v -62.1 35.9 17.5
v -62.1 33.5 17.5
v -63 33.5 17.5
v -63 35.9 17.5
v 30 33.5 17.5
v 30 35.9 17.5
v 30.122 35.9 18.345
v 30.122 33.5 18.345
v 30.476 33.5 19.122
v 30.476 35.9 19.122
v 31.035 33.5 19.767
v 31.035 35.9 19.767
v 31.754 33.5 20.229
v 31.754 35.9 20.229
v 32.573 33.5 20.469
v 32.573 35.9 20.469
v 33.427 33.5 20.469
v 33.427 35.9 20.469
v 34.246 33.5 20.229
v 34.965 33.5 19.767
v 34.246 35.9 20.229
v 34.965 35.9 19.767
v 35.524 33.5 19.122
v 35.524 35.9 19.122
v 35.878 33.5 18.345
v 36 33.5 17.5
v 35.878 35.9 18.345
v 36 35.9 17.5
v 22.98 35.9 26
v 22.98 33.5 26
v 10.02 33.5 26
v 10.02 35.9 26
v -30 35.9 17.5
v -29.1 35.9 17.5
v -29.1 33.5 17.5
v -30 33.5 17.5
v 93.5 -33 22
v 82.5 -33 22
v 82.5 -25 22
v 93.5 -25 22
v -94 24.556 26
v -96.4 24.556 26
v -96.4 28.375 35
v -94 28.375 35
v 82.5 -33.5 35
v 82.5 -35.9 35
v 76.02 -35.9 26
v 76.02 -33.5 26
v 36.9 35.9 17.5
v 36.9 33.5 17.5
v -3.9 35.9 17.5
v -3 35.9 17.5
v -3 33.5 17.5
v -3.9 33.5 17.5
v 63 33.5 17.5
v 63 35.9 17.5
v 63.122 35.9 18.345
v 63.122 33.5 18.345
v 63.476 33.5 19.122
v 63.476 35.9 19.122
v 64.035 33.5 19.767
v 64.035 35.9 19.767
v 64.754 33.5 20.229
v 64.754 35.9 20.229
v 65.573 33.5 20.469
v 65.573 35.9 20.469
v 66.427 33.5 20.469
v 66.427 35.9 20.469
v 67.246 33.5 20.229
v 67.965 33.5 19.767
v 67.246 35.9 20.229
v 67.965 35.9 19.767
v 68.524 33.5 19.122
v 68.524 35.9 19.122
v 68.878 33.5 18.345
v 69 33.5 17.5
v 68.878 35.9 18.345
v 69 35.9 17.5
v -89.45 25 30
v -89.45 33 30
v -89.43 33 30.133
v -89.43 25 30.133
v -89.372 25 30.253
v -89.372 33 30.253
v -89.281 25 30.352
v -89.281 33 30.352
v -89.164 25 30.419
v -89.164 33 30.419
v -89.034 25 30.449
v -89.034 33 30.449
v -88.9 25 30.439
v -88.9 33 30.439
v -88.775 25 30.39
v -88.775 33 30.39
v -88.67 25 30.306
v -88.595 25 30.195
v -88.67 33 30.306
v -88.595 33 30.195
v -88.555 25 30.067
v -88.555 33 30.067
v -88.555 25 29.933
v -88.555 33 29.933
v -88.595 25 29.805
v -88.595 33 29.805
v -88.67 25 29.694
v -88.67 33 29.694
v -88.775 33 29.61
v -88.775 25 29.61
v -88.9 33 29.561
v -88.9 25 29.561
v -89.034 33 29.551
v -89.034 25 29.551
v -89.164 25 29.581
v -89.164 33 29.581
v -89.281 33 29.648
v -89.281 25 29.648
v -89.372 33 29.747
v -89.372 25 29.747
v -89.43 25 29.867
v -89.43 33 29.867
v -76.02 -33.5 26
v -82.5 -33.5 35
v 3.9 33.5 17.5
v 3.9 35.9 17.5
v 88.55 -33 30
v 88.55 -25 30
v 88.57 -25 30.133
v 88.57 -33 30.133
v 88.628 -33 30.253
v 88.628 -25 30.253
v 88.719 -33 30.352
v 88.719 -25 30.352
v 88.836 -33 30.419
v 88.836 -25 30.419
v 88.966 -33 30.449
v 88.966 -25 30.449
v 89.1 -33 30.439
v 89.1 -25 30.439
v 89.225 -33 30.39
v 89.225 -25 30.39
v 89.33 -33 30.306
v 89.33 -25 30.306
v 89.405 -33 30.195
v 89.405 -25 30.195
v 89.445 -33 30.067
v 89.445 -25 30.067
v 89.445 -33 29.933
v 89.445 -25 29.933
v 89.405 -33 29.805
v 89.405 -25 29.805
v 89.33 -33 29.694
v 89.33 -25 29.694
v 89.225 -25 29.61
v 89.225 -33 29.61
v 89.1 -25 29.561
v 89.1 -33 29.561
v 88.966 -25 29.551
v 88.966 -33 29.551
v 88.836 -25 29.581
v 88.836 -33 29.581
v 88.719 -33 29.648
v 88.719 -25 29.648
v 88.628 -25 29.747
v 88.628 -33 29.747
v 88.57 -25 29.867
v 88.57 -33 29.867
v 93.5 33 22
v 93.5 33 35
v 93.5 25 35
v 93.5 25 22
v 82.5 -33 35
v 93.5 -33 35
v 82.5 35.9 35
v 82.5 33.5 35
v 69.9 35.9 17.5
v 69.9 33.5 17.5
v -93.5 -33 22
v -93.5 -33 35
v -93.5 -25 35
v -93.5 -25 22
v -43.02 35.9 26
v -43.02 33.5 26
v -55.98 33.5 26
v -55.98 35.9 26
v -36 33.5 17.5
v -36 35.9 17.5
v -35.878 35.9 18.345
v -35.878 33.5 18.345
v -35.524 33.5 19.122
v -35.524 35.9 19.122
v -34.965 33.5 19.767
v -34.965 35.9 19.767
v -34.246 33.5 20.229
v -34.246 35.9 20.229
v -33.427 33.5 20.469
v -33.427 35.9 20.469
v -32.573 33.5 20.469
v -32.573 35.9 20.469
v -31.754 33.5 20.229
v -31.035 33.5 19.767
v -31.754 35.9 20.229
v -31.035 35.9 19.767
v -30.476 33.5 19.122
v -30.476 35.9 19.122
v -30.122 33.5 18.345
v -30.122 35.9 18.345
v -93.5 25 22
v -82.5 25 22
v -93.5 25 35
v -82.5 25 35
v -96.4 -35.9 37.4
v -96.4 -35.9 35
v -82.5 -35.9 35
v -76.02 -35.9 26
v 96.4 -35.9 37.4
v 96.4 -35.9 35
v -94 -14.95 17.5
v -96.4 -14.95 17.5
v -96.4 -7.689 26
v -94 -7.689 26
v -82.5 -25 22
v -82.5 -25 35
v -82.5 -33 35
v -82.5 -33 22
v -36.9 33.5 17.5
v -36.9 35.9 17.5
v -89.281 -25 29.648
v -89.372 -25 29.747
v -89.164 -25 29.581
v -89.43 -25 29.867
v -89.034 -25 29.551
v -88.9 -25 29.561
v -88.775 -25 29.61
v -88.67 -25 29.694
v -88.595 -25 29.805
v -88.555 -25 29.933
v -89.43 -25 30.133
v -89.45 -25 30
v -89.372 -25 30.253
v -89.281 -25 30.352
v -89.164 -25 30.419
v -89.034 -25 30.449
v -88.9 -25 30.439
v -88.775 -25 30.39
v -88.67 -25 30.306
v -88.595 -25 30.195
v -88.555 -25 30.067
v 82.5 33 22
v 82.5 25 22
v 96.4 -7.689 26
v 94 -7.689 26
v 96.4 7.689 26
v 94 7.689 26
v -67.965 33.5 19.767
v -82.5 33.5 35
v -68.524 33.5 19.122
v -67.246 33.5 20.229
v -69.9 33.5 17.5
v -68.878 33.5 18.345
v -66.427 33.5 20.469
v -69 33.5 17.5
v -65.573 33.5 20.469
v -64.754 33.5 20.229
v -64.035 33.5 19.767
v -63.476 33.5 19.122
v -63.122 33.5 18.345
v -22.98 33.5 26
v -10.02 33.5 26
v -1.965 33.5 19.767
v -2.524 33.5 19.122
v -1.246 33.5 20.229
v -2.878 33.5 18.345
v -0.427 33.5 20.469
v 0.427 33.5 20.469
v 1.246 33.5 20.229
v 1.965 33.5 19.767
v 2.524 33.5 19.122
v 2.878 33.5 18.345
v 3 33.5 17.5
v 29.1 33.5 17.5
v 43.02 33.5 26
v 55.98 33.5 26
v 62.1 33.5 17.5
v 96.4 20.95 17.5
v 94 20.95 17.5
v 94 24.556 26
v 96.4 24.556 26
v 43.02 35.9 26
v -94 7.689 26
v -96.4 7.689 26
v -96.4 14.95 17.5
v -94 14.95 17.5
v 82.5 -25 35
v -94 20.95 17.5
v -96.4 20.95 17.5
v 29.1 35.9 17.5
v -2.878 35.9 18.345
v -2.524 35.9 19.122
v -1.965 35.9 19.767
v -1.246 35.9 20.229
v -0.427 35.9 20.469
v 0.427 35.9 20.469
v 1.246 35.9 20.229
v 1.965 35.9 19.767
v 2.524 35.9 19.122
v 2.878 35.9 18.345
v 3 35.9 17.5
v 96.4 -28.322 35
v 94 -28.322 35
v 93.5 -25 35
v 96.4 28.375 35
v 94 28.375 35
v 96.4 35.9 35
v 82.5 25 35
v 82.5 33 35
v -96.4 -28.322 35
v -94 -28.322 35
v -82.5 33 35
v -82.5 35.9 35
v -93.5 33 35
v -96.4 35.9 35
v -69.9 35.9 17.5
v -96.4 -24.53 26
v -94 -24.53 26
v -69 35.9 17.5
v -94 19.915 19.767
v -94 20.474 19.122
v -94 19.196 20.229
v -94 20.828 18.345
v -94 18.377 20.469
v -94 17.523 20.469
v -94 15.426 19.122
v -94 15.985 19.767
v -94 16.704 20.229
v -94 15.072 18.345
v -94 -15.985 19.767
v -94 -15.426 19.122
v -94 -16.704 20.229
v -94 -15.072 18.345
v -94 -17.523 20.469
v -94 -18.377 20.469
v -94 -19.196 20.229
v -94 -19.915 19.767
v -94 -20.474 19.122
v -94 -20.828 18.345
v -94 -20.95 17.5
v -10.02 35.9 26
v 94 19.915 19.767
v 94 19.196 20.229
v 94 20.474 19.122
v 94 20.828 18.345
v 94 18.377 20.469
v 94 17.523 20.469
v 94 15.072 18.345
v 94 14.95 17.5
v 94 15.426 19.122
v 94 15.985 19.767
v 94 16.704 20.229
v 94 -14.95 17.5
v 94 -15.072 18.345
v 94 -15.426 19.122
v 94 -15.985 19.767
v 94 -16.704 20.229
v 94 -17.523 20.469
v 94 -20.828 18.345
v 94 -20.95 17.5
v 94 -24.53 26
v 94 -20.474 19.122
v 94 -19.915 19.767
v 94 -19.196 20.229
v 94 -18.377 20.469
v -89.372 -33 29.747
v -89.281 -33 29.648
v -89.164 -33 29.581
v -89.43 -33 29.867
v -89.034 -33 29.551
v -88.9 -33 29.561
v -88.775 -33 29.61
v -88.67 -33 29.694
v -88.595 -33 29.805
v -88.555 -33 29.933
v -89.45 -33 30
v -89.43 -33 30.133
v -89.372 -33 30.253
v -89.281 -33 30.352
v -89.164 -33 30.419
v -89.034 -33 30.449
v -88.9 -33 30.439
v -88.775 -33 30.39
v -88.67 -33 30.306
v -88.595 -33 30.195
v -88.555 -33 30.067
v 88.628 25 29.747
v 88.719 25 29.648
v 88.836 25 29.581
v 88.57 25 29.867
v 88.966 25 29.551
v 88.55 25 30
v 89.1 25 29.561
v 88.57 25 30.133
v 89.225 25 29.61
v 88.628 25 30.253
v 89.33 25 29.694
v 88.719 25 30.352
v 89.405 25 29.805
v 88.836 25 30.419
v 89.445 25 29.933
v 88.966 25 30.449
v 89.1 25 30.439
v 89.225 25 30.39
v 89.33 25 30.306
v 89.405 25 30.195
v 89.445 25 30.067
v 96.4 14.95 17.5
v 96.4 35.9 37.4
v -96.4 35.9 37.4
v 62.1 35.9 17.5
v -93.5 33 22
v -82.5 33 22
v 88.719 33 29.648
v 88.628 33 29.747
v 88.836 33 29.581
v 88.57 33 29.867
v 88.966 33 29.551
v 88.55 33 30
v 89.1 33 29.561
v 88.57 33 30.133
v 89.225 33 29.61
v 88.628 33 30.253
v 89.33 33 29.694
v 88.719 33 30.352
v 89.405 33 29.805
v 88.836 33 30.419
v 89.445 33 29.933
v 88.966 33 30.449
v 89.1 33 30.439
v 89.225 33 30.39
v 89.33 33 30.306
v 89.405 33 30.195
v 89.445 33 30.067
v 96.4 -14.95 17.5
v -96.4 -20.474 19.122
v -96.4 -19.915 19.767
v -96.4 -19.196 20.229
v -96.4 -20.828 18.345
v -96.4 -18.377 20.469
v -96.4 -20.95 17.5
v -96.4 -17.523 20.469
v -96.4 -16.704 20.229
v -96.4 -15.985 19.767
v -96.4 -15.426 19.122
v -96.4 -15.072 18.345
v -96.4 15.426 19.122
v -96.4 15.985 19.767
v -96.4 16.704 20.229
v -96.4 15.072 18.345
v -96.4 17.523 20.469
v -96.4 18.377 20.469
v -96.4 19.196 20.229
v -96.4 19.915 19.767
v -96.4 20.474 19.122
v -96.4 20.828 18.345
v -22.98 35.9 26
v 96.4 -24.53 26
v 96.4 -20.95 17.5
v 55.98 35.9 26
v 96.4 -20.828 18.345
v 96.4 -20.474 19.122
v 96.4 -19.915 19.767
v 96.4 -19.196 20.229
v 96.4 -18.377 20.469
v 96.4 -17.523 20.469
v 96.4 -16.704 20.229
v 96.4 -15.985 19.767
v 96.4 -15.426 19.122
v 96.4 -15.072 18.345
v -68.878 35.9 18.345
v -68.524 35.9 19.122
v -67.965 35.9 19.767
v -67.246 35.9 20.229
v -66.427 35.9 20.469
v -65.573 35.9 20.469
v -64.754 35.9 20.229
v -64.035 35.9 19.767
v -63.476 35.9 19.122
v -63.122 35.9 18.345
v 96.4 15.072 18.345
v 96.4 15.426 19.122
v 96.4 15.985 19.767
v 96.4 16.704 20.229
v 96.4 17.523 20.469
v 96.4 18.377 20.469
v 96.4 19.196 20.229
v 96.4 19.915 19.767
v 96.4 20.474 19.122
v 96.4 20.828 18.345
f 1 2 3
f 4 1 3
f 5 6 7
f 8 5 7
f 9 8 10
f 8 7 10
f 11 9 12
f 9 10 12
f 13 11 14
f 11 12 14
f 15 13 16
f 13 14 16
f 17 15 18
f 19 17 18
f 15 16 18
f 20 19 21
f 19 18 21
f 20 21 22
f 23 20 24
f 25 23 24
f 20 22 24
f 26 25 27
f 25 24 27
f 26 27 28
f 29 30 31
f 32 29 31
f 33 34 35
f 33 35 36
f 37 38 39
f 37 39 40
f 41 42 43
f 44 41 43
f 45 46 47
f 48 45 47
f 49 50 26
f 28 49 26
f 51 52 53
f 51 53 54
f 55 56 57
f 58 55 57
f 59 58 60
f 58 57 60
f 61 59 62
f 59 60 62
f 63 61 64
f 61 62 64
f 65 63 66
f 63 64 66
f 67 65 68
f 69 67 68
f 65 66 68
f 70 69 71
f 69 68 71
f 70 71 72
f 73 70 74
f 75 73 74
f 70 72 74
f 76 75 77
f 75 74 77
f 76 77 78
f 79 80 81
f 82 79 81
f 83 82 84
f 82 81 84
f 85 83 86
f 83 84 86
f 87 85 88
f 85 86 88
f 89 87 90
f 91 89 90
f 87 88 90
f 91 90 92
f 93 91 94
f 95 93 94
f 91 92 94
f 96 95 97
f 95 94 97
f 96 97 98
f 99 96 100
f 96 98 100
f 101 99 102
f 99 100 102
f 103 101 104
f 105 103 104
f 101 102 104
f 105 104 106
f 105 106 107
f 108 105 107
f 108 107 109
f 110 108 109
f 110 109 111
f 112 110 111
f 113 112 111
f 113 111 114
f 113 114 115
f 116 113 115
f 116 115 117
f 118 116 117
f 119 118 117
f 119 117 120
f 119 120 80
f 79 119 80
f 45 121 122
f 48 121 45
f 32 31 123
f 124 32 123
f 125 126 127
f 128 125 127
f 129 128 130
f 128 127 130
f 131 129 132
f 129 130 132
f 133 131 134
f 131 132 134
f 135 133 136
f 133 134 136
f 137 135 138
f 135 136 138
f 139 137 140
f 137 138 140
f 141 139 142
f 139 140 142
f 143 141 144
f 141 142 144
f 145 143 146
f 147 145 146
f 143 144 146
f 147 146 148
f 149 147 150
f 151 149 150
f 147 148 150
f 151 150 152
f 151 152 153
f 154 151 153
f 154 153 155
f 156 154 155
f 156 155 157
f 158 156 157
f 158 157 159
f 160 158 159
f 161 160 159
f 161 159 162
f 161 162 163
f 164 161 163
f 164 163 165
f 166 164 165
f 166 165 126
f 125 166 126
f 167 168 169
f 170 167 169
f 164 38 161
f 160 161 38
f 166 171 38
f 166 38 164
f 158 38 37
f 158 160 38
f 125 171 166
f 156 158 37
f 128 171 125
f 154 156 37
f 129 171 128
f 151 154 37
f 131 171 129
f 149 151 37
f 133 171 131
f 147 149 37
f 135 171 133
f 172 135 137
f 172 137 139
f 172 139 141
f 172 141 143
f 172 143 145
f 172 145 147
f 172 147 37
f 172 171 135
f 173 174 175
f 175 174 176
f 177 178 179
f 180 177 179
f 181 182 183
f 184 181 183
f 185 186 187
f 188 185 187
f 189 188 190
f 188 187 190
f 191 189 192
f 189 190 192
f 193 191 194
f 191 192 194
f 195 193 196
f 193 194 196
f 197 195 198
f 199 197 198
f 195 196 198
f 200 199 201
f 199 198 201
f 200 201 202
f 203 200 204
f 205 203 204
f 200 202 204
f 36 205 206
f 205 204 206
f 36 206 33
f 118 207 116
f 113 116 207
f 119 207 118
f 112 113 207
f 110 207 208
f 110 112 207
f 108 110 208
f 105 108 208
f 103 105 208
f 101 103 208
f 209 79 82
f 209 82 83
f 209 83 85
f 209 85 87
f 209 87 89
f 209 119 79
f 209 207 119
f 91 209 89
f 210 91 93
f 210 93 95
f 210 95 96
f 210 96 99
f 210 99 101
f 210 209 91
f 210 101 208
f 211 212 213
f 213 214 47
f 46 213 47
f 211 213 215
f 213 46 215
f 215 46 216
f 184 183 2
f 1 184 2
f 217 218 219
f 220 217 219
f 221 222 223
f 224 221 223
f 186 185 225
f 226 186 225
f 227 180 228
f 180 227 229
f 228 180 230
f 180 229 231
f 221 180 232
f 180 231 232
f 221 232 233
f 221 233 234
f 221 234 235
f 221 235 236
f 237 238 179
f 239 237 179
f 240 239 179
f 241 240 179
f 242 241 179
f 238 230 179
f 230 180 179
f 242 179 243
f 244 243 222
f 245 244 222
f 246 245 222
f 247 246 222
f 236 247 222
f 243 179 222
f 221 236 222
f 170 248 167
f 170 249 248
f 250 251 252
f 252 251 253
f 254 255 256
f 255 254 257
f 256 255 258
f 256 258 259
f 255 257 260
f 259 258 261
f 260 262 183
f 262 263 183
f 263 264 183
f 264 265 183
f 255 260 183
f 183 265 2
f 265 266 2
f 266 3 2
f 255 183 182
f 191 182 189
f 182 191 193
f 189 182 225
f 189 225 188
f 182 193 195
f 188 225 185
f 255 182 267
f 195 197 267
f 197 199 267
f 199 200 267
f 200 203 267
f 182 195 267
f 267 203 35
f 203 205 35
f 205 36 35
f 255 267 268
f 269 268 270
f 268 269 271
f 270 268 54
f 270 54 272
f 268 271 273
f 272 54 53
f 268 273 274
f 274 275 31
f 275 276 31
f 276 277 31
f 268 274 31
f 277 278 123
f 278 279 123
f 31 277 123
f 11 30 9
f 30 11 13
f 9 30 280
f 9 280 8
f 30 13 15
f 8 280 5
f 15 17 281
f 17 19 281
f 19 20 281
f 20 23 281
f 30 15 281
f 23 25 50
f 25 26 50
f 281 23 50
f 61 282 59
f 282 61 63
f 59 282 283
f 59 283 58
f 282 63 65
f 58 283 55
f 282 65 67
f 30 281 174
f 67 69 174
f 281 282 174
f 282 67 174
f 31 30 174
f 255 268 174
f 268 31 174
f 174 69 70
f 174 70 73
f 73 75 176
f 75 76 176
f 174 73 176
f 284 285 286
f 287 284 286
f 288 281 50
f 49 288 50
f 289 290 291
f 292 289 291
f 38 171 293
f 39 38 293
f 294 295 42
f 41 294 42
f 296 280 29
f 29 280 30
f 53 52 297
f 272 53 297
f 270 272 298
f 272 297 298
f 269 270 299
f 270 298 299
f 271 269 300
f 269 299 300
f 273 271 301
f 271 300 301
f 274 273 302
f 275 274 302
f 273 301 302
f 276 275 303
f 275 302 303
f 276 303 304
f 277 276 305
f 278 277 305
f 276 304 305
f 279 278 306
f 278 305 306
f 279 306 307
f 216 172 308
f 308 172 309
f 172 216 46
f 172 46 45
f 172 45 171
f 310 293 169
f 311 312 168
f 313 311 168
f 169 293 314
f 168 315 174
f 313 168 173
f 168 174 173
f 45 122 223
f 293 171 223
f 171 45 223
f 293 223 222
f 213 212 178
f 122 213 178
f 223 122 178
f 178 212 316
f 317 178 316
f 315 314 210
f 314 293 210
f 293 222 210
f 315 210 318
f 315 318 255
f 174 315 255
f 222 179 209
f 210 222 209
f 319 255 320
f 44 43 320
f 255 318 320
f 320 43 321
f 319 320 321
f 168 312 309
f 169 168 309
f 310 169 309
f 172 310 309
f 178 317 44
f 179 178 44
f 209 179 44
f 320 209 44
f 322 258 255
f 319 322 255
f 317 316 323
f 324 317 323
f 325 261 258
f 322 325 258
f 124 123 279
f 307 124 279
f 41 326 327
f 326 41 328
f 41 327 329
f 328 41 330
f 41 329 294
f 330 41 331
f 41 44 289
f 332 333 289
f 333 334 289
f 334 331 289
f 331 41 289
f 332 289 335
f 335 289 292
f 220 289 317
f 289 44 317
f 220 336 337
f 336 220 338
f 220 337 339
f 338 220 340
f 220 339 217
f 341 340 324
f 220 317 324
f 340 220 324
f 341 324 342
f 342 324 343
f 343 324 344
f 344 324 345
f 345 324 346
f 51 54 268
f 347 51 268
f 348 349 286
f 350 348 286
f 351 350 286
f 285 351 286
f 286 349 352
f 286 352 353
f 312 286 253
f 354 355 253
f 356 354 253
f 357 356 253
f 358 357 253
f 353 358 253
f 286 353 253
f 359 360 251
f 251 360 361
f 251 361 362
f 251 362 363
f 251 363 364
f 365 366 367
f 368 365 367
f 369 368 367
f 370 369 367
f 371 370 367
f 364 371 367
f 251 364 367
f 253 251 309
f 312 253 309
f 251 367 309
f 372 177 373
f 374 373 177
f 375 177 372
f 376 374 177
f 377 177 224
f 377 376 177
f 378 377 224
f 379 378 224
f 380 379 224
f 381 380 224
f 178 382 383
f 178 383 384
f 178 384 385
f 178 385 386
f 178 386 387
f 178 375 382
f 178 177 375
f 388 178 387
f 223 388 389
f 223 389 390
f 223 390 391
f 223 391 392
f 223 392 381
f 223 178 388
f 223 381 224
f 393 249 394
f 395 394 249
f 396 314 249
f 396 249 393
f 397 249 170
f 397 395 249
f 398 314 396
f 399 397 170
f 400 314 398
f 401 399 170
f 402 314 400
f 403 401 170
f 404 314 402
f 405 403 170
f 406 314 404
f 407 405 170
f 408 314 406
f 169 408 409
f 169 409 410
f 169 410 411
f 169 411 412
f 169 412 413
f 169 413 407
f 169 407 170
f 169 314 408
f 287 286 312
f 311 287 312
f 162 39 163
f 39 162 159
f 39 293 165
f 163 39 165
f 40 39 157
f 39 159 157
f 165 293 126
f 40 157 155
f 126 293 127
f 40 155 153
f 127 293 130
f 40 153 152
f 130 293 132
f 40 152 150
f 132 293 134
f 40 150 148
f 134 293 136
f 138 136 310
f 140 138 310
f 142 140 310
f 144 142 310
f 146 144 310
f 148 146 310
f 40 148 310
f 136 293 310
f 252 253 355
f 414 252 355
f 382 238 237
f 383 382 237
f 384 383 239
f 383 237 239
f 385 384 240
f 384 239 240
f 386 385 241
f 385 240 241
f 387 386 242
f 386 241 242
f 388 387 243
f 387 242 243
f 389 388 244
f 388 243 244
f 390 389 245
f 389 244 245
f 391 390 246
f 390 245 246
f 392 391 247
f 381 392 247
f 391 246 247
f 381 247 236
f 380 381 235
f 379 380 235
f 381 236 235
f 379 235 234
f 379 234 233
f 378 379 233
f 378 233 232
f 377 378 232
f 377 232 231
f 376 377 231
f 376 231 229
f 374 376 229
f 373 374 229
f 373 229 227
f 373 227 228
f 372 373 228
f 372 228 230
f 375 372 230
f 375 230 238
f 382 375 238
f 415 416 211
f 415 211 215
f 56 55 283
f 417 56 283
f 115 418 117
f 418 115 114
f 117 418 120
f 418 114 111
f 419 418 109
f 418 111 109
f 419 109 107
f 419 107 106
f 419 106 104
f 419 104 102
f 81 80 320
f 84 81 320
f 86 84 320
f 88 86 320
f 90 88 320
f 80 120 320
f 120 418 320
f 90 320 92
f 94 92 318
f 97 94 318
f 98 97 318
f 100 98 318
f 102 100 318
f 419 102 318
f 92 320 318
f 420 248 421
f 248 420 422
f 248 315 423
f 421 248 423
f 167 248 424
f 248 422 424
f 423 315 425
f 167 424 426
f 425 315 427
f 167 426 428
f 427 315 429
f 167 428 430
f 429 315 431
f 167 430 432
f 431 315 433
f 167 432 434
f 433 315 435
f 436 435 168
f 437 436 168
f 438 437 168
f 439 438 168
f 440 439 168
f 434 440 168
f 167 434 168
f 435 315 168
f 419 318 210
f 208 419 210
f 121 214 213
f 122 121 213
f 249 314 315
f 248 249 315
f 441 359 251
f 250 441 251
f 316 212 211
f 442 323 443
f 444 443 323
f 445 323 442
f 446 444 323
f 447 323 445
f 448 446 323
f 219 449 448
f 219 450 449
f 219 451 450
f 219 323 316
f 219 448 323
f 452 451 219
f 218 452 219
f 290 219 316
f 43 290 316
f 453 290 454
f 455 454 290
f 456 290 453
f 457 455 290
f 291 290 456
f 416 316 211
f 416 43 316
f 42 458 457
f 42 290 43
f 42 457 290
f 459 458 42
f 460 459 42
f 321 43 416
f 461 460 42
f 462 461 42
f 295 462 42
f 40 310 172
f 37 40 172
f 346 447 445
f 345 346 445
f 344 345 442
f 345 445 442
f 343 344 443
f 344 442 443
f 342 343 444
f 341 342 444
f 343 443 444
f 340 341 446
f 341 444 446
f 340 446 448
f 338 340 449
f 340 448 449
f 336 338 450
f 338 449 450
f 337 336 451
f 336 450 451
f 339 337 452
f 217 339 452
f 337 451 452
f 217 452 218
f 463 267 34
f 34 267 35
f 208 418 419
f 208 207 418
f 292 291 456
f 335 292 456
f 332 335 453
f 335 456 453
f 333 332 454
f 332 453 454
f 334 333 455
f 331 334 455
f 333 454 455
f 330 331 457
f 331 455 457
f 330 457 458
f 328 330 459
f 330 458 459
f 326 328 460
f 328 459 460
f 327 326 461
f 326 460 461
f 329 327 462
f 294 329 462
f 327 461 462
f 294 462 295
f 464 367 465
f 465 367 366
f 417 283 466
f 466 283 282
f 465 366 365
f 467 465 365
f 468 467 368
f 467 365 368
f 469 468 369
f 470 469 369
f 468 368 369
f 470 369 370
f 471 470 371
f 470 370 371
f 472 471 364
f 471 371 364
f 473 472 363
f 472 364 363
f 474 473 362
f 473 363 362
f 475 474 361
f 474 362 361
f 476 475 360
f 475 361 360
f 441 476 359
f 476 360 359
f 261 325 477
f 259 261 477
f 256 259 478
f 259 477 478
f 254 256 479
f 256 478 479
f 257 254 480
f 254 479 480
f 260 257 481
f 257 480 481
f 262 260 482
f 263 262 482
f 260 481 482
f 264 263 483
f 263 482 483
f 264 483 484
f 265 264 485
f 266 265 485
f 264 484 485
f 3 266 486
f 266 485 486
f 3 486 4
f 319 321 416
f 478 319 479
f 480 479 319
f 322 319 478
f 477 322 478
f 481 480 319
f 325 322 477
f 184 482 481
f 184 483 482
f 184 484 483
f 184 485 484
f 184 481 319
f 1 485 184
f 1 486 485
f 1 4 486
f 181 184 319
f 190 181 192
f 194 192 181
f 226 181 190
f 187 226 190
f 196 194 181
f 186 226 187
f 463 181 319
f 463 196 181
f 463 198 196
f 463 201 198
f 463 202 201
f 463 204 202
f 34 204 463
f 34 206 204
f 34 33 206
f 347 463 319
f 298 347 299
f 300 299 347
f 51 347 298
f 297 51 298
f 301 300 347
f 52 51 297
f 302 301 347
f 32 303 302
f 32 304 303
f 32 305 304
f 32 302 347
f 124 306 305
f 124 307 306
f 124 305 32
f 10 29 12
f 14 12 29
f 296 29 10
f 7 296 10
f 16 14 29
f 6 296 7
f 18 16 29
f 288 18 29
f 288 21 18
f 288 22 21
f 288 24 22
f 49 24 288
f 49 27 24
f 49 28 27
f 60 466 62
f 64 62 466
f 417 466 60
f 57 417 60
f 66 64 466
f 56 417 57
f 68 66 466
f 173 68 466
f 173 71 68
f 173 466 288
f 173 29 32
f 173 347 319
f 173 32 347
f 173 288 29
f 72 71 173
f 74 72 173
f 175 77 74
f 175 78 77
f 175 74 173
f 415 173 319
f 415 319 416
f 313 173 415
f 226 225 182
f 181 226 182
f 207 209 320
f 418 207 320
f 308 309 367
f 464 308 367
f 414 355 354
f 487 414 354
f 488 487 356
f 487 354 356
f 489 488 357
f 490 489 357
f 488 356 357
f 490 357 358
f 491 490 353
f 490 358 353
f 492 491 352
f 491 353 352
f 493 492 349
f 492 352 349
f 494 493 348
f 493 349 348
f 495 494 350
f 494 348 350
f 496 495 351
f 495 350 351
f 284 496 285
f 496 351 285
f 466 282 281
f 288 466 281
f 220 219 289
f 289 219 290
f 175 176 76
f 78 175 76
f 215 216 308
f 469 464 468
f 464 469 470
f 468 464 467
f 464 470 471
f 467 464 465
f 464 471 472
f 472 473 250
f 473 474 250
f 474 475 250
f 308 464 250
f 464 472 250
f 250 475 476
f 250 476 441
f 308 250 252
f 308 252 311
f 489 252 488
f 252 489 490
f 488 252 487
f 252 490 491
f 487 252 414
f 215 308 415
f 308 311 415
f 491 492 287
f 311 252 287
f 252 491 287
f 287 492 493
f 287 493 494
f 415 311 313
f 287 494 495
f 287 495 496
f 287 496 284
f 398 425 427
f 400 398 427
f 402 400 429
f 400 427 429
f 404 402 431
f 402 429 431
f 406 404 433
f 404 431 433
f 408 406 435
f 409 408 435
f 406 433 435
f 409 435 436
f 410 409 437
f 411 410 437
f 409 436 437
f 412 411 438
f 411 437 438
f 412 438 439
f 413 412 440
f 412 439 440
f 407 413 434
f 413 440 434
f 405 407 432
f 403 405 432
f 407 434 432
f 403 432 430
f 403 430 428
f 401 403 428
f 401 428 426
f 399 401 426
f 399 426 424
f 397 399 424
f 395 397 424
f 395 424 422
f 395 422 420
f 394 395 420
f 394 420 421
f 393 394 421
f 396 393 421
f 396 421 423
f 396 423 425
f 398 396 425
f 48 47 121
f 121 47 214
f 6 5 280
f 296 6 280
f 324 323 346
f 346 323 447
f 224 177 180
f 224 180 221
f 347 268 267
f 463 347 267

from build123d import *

# Parameters (mm, degrees)
F0_W      = 192.8
F0_H      = 71.8
F0_W_2    = 188
F0_H_2    = 67
F1_DEPTH  = 35
F2_R      = 3
F3_DEPTH  = 192.801
F4_R      = 3.9
F5_DEPTH  = 25
F6_R      = 3
F7_DEPTH  = 25
F8_W      = 192.8
F8_H      = 71.8
F8_W_2    = 188
F8_H_2    = 67
F11_DEPTH = 2.4
F12_DEPTH = 71.801
F13_DEPTH = 5
F14_START = -183.4
F14_DEPTH = 21.3
F15_W     = 11
F15_H     = 4.6784730554
F15_H_2   = 4.6253820807
F15_H_3   = 3.3215269446
F15_H_4   = 3.3746179193
F16_DEPTH = 13
F17_DEPTH = 25
F18_R     = 0.45
F19_DEPTH = 68.901


with BuildPart() as f1:
    # F0 (on Top) → F1 (new body)
    with BuildSketch(Plane.XY):
        Rectangle(F0_W, F0_H)
        Rectangle(F0_W_2, F0_H_2, mode=Mode.SUBTRACT)
    extrude(amount=F1_DEPTH)

    # F2 (on face) → F3 (cut, through all)
    with BuildSketch(Plane(origin=(-96.4, 0, 0), x_dir=(0, -1, 0), z_dir=(-1, 0, 0))):
        with Locations((-17.95, 17.5)):
            Circle(F2_R)
        with Locations((17.95, 17.5)):
            Circle(F2_R)
    extrude(amount=-F3_DEPTH, mode=Mode.SUBTRACT)

    # F4 (on face) → F5 (cut)
    with BuildSketch(Plane.XZ.offset(35.9)):
        with Locations((0, 17.5)):
            Circle(F4_R)
        with Locations((33, 17.5)):
            Circle(F4_R)
        with Locations((66, 17.5)):
            Circle(F4_R)
        with Locations((-33, 17.5)):
            Circle(F4_R)
        with Locations((-66, 17.5)):
            Circle(F4_R)
    extrude(amount=-F5_DEPTH, mode=Mode.SUBTRACT)

    # F6 (on face) → F7 (cut)
    with BuildSketch(Plane(origin=(0, 35.9, 0), x_dir=(-1, 0, 0), z_dir=(0, 1, 0))):
        with Locations((0, 17.5)):
            Circle(F6_R)
        with Locations((33, 17.5)):
            Circle(F6_R)
        with Locations((66, 17.5)):
            Circle(F6_R)
        with Locations((-33, 17.5)):
            Circle(F6_R)
        with Locations((-66, 17.5)):
            Circle(F6_R)
    extrude(amount=-F7_DEPTH, mode=Mode.SUBTRACT)

    # F8 (on face) → F11 (join)
    with BuildSketch(Plane.XY.offset(35)):
        Rectangle(F8_W, F8_H)
        Rectangle(F8_W_2, F8_H_2, mode=Mode.SUBTRACT)
        Rectangle(F8_W_2, F8_H_2)
    extrude(amount=F11_DEPTH)

    # F10 (on face) → F12 (cut, through all)
    with BuildSketch(Plane.XZ.offset(35.9)):
        with BuildLine():
            Line((-69.9, 17.5), (-76.02, 26))
            Line((-76.02, 26), (-94, 26))
            Line((-94, 26), (-94, 0))
            Line((-94, 0), (94, 0))
            Line((94, 0), (94, 26))
            Line((94, 26), (76.02, 26))
            Line((76.02, 26), (69.9, 17.5))
            ThreePointArc((69.9, 17.5), (66, 13.6), (62.1, 17.5))
            Line((62.1, 17.5), (55.98, 26))
            Line((55.98, 26), (43.02, 26))
            Line((43.02, 26), (36.9, 17.5))
            ThreePointArc((36.9, 17.5), (33, 13.6), (29.1, 17.5))
            Line((29.1, 17.5), (22.98, 26))
            Line((22.98, 26), (10.02, 26))
            Line((10.02, 26), (3.9, 17.5))
            ThreePointArc((3.9, 17.5), (0, 13.6), (-3.9, 17.5))
            Line((-3.9, 17.5), (-10.02, 26))
            Line((-10.02, 26), (-22.98, 26))
            Line((-22.98, 26), (-29.1, 17.5))
            ThreePointArc((-29.1, 17.5), (-33, 13.6), (-36.9, 17.5))
            Line((-36.9, 17.5), (-43.02, 26))
            Line((-43.02, 26), (-55.98, 26))
            Line((-55.98, 26), (-62.1, 17.5))
            ThreePointArc((-62.1, 17.5), (-66, 13.6), (-69.9, 17.5))
        make_face()
        Polygon((-76.02, 26), (-82.5, 35), (-94, 35), (-94, 26), align=None)
        Polygon((76.02, 26), (94, 26), (94, 35), (82.5, 35), align=None)
        with BuildLine():
            Line((-62.1, 17.5), (-69.9, 17.5))
            ThreePointArc((-69.9, 17.5), (-66, 13.6), (-62.1, 17.5))
        make_face()
        with BuildLine():
            Line((-29.1, 17.5), (-36.9, 17.5))
            ThreePointArc((-36.9, 17.5), (-33, 13.6), (-29.1, 17.5))
        make_face()
        with BuildLine():
            Line((3.9, 17.5), (-3.9, 17.5))
            ThreePointArc((-3.9, 17.5), (0, 13.6), (3.9, 17.5))
        make_face()
        with BuildLine():
            Line((36.9, 17.5), (29.1, 17.5))
            ThreePointArc((29.1, 17.5), (33, 13.6), (36.9, 17.5))
        make_face()
        with BuildLine():
            Line((69.9, 17.5), (62.1, 17.5))
            ThreePointArc((62.1, 17.5), (66, 13.6), (69.9, 17.5))
        make_face()
    extrude(amount=-F12_DEPTH, mode=Mode.SUBTRACT)

    # F9 (on face) → F13 (cut)
    with BuildSketch(Plane(origin=(-96.4, 0, 0), x_dir=(0, -1, 0), z_dir=(-1, 0, 0))):
        with BuildLine():
            Line((-20.95, 17.5), (-24.5562429894, 26))
            Line((-24.5562429894, 26), (-35.9, 26))
            Line((-35.9, 26), (-35.9, 0))
            Line((-35.9, 0), (35.9, 0))
            Line((35.9, 0), (35.9, 26))
            Line((35.9, 26), (24.5304559445, 26))
            Line((24.5304559445, 26), (20.95, 17.5))
            ThreePointArc((20.95, 17.5), (17.95, 14.5), (14.95, 17.5))
            Line((14.95, 17.5), (7.6885714286, 26))
            Line((7.6885714286, 26), (-7.6885714286, 26))
            Line((-7.6885714286, 26), (-14.95, 17.5))
            ThreePointArc((-14.95, 17.5), (-17.95, 14.5), (-20.95, 17.5))
        make_face()
        Polygon((-24.5562429894, 26), (-28.3746179193, 35), (-35.9, 35), (-35.9, 26), align=None)
        Polygon((35.9, 35), (28.3215269446, 35), (24.5304559445, 26), (35.9, 26), align=None)
    extrude(amount=-F13_DEPTH, mode=Mode.SUBTRACT)

    # F9 (on face) → F14 (cut)
    with BuildSketch(Plane(origin=(-96.4, 0, 0), x_dir=(0, -1, 0), z_dir=(-1, 0, 0)).offset(F14_START)):
        Polygon((-24.5562429894, 26), (-28.3746179193, 35), (-35.9, 35), (-35.9, 26), align=None)
        Polygon((35.9, 35), (28.3215269446, 35), (24.5304559445, 26), (35.9, 26), align=None)
        with BuildLine():
            Line((-20.95, 17.5), (-24.5562429894, 26))
            Line((-24.5562429894, 26), (-35.9, 26))
            Line((-35.9, 26), (-35.9, 0))
            Line((-35.9, 0), (35.9, 0))
            Line((35.9, 0), (35.9, 26))
            Line((35.9, 26), (24.5304559445, 26))
            Line((24.5304559445, 26), (20.95, 17.5))
            ThreePointArc((20.95, 17.5), (17.95, 14.5), (14.95, 17.5))
            Line((14.95, 17.5), (7.6885714286, 26))
            Line((7.6885714286, 26), (-7.6885714286, 26))
            Line((-7.6885714286, 26), (-14.95, 17.5))
            ThreePointArc((-14.95, 17.5), (-17.95, 14.5), (-20.95, 17.5))
        make_face()
    extrude(amount=-F14_DEPTH, mode=Mode.SUBTRACT)

    # F15 (on face) → F16 (join)
    with BuildSketch(Plane(origin=(0, 0, 35), x_dir=(1, 0, 0), z_dir=(0, 0, -1))):
        with Locations((-88, 30.6607634723)):
            Rectangle(F15_W, F15_H)
        with Locations((-88, -30.6873089597)):
            Rectangle(F15_W, F15_H_2)
        with Locations((88, -30.6873089597)):
            Rectangle(F15_W, F15_H_2)
        with Locations((88, 30.6607634723)):
            Rectangle(F15_W, F15_H)
        with Locations((88, 26.6607634723)):
            Rectangle(F15_W, F15_H_3)
        with Locations((88, -26.6873089597)):
            Rectangle(F15_W, F15_H_4)
        with Locations((-88, -26.6873089597)):
            Rectangle(F15_W, F15_H_4)
        with Locations((-88, 26.6607634723)):
            Rectangle(F15_W, F15_H_3)
    extrude(amount=F16_DEPTH)

    # F10 (on face) → F17 (cut)
    with BuildSketch(Plane.XZ.offset(35.9)):
        with BuildLine():
            Line((-55.98, 26), (-76.02, 26))
            Line((-76.02, 26), (-69.9, 17.5))
            ThreePointArc((-69.9, 17.5), (-66, 21.4), (-62.1, 17.5))
            Line((-62.1, 17.5), (-55.98, 26))
        make_face()
        with BuildLine():
            Line((-22.98, 26), (-43.02, 26))
            Line((-43.02, 26), (-36.9, 17.5))
            ThreePointArc((-36.9, 17.5), (-33, 21.4), (-29.1, 17.5))
            Line((-29.1, 17.5), (-22.98, 26))
        make_face()
        with BuildLine():
            Line((10.02, 26), (-10.02, 26))
            Line((-10.02, 26), (-3.9, 17.5))
            ThreePointArc((-3.9, 17.5), (0, 21.4), (3.9, 17.5))
            Line((3.9, 17.5), (10.02, 26))
        make_face()
        with BuildLine():
            Line((43.02, 26), (22.98, 26))
            Line((22.98, 26), (29.1, 17.5))
            ThreePointArc((29.1, 17.5), (33, 21.4), (36.9, 17.5))
            Line((36.9, 17.5), (43.02, 26))
        make_face()
        with BuildLine():
            Line((76.02, 26), (55.98, 26))
            Line((55.98, 26), (62.1, 17.5))
            ThreePointArc((62.1, 17.5), (66, 21.4), (69.9, 17.5))
            Line((69.9, 17.5), (76.02, 26))
        make_face()
    extrude(amount=-F17_DEPTH, mode=Mode.SUBTRACT)

    # F18 (on face) → F19 (cut, through all)
    with BuildSketch(Plane(origin=(0, 33, 0), x_dir=(-1, 0, 0), z_dir=(0, 1, 0))):
        with Locations((-89, 30)):
            Circle(F18_R)
        with Locations((89, 30)):
            Circle(F18_R)
    extrude(amount=-F19_DEPTH, mode=Mode.SUBTRACT)


solid = f1.part
